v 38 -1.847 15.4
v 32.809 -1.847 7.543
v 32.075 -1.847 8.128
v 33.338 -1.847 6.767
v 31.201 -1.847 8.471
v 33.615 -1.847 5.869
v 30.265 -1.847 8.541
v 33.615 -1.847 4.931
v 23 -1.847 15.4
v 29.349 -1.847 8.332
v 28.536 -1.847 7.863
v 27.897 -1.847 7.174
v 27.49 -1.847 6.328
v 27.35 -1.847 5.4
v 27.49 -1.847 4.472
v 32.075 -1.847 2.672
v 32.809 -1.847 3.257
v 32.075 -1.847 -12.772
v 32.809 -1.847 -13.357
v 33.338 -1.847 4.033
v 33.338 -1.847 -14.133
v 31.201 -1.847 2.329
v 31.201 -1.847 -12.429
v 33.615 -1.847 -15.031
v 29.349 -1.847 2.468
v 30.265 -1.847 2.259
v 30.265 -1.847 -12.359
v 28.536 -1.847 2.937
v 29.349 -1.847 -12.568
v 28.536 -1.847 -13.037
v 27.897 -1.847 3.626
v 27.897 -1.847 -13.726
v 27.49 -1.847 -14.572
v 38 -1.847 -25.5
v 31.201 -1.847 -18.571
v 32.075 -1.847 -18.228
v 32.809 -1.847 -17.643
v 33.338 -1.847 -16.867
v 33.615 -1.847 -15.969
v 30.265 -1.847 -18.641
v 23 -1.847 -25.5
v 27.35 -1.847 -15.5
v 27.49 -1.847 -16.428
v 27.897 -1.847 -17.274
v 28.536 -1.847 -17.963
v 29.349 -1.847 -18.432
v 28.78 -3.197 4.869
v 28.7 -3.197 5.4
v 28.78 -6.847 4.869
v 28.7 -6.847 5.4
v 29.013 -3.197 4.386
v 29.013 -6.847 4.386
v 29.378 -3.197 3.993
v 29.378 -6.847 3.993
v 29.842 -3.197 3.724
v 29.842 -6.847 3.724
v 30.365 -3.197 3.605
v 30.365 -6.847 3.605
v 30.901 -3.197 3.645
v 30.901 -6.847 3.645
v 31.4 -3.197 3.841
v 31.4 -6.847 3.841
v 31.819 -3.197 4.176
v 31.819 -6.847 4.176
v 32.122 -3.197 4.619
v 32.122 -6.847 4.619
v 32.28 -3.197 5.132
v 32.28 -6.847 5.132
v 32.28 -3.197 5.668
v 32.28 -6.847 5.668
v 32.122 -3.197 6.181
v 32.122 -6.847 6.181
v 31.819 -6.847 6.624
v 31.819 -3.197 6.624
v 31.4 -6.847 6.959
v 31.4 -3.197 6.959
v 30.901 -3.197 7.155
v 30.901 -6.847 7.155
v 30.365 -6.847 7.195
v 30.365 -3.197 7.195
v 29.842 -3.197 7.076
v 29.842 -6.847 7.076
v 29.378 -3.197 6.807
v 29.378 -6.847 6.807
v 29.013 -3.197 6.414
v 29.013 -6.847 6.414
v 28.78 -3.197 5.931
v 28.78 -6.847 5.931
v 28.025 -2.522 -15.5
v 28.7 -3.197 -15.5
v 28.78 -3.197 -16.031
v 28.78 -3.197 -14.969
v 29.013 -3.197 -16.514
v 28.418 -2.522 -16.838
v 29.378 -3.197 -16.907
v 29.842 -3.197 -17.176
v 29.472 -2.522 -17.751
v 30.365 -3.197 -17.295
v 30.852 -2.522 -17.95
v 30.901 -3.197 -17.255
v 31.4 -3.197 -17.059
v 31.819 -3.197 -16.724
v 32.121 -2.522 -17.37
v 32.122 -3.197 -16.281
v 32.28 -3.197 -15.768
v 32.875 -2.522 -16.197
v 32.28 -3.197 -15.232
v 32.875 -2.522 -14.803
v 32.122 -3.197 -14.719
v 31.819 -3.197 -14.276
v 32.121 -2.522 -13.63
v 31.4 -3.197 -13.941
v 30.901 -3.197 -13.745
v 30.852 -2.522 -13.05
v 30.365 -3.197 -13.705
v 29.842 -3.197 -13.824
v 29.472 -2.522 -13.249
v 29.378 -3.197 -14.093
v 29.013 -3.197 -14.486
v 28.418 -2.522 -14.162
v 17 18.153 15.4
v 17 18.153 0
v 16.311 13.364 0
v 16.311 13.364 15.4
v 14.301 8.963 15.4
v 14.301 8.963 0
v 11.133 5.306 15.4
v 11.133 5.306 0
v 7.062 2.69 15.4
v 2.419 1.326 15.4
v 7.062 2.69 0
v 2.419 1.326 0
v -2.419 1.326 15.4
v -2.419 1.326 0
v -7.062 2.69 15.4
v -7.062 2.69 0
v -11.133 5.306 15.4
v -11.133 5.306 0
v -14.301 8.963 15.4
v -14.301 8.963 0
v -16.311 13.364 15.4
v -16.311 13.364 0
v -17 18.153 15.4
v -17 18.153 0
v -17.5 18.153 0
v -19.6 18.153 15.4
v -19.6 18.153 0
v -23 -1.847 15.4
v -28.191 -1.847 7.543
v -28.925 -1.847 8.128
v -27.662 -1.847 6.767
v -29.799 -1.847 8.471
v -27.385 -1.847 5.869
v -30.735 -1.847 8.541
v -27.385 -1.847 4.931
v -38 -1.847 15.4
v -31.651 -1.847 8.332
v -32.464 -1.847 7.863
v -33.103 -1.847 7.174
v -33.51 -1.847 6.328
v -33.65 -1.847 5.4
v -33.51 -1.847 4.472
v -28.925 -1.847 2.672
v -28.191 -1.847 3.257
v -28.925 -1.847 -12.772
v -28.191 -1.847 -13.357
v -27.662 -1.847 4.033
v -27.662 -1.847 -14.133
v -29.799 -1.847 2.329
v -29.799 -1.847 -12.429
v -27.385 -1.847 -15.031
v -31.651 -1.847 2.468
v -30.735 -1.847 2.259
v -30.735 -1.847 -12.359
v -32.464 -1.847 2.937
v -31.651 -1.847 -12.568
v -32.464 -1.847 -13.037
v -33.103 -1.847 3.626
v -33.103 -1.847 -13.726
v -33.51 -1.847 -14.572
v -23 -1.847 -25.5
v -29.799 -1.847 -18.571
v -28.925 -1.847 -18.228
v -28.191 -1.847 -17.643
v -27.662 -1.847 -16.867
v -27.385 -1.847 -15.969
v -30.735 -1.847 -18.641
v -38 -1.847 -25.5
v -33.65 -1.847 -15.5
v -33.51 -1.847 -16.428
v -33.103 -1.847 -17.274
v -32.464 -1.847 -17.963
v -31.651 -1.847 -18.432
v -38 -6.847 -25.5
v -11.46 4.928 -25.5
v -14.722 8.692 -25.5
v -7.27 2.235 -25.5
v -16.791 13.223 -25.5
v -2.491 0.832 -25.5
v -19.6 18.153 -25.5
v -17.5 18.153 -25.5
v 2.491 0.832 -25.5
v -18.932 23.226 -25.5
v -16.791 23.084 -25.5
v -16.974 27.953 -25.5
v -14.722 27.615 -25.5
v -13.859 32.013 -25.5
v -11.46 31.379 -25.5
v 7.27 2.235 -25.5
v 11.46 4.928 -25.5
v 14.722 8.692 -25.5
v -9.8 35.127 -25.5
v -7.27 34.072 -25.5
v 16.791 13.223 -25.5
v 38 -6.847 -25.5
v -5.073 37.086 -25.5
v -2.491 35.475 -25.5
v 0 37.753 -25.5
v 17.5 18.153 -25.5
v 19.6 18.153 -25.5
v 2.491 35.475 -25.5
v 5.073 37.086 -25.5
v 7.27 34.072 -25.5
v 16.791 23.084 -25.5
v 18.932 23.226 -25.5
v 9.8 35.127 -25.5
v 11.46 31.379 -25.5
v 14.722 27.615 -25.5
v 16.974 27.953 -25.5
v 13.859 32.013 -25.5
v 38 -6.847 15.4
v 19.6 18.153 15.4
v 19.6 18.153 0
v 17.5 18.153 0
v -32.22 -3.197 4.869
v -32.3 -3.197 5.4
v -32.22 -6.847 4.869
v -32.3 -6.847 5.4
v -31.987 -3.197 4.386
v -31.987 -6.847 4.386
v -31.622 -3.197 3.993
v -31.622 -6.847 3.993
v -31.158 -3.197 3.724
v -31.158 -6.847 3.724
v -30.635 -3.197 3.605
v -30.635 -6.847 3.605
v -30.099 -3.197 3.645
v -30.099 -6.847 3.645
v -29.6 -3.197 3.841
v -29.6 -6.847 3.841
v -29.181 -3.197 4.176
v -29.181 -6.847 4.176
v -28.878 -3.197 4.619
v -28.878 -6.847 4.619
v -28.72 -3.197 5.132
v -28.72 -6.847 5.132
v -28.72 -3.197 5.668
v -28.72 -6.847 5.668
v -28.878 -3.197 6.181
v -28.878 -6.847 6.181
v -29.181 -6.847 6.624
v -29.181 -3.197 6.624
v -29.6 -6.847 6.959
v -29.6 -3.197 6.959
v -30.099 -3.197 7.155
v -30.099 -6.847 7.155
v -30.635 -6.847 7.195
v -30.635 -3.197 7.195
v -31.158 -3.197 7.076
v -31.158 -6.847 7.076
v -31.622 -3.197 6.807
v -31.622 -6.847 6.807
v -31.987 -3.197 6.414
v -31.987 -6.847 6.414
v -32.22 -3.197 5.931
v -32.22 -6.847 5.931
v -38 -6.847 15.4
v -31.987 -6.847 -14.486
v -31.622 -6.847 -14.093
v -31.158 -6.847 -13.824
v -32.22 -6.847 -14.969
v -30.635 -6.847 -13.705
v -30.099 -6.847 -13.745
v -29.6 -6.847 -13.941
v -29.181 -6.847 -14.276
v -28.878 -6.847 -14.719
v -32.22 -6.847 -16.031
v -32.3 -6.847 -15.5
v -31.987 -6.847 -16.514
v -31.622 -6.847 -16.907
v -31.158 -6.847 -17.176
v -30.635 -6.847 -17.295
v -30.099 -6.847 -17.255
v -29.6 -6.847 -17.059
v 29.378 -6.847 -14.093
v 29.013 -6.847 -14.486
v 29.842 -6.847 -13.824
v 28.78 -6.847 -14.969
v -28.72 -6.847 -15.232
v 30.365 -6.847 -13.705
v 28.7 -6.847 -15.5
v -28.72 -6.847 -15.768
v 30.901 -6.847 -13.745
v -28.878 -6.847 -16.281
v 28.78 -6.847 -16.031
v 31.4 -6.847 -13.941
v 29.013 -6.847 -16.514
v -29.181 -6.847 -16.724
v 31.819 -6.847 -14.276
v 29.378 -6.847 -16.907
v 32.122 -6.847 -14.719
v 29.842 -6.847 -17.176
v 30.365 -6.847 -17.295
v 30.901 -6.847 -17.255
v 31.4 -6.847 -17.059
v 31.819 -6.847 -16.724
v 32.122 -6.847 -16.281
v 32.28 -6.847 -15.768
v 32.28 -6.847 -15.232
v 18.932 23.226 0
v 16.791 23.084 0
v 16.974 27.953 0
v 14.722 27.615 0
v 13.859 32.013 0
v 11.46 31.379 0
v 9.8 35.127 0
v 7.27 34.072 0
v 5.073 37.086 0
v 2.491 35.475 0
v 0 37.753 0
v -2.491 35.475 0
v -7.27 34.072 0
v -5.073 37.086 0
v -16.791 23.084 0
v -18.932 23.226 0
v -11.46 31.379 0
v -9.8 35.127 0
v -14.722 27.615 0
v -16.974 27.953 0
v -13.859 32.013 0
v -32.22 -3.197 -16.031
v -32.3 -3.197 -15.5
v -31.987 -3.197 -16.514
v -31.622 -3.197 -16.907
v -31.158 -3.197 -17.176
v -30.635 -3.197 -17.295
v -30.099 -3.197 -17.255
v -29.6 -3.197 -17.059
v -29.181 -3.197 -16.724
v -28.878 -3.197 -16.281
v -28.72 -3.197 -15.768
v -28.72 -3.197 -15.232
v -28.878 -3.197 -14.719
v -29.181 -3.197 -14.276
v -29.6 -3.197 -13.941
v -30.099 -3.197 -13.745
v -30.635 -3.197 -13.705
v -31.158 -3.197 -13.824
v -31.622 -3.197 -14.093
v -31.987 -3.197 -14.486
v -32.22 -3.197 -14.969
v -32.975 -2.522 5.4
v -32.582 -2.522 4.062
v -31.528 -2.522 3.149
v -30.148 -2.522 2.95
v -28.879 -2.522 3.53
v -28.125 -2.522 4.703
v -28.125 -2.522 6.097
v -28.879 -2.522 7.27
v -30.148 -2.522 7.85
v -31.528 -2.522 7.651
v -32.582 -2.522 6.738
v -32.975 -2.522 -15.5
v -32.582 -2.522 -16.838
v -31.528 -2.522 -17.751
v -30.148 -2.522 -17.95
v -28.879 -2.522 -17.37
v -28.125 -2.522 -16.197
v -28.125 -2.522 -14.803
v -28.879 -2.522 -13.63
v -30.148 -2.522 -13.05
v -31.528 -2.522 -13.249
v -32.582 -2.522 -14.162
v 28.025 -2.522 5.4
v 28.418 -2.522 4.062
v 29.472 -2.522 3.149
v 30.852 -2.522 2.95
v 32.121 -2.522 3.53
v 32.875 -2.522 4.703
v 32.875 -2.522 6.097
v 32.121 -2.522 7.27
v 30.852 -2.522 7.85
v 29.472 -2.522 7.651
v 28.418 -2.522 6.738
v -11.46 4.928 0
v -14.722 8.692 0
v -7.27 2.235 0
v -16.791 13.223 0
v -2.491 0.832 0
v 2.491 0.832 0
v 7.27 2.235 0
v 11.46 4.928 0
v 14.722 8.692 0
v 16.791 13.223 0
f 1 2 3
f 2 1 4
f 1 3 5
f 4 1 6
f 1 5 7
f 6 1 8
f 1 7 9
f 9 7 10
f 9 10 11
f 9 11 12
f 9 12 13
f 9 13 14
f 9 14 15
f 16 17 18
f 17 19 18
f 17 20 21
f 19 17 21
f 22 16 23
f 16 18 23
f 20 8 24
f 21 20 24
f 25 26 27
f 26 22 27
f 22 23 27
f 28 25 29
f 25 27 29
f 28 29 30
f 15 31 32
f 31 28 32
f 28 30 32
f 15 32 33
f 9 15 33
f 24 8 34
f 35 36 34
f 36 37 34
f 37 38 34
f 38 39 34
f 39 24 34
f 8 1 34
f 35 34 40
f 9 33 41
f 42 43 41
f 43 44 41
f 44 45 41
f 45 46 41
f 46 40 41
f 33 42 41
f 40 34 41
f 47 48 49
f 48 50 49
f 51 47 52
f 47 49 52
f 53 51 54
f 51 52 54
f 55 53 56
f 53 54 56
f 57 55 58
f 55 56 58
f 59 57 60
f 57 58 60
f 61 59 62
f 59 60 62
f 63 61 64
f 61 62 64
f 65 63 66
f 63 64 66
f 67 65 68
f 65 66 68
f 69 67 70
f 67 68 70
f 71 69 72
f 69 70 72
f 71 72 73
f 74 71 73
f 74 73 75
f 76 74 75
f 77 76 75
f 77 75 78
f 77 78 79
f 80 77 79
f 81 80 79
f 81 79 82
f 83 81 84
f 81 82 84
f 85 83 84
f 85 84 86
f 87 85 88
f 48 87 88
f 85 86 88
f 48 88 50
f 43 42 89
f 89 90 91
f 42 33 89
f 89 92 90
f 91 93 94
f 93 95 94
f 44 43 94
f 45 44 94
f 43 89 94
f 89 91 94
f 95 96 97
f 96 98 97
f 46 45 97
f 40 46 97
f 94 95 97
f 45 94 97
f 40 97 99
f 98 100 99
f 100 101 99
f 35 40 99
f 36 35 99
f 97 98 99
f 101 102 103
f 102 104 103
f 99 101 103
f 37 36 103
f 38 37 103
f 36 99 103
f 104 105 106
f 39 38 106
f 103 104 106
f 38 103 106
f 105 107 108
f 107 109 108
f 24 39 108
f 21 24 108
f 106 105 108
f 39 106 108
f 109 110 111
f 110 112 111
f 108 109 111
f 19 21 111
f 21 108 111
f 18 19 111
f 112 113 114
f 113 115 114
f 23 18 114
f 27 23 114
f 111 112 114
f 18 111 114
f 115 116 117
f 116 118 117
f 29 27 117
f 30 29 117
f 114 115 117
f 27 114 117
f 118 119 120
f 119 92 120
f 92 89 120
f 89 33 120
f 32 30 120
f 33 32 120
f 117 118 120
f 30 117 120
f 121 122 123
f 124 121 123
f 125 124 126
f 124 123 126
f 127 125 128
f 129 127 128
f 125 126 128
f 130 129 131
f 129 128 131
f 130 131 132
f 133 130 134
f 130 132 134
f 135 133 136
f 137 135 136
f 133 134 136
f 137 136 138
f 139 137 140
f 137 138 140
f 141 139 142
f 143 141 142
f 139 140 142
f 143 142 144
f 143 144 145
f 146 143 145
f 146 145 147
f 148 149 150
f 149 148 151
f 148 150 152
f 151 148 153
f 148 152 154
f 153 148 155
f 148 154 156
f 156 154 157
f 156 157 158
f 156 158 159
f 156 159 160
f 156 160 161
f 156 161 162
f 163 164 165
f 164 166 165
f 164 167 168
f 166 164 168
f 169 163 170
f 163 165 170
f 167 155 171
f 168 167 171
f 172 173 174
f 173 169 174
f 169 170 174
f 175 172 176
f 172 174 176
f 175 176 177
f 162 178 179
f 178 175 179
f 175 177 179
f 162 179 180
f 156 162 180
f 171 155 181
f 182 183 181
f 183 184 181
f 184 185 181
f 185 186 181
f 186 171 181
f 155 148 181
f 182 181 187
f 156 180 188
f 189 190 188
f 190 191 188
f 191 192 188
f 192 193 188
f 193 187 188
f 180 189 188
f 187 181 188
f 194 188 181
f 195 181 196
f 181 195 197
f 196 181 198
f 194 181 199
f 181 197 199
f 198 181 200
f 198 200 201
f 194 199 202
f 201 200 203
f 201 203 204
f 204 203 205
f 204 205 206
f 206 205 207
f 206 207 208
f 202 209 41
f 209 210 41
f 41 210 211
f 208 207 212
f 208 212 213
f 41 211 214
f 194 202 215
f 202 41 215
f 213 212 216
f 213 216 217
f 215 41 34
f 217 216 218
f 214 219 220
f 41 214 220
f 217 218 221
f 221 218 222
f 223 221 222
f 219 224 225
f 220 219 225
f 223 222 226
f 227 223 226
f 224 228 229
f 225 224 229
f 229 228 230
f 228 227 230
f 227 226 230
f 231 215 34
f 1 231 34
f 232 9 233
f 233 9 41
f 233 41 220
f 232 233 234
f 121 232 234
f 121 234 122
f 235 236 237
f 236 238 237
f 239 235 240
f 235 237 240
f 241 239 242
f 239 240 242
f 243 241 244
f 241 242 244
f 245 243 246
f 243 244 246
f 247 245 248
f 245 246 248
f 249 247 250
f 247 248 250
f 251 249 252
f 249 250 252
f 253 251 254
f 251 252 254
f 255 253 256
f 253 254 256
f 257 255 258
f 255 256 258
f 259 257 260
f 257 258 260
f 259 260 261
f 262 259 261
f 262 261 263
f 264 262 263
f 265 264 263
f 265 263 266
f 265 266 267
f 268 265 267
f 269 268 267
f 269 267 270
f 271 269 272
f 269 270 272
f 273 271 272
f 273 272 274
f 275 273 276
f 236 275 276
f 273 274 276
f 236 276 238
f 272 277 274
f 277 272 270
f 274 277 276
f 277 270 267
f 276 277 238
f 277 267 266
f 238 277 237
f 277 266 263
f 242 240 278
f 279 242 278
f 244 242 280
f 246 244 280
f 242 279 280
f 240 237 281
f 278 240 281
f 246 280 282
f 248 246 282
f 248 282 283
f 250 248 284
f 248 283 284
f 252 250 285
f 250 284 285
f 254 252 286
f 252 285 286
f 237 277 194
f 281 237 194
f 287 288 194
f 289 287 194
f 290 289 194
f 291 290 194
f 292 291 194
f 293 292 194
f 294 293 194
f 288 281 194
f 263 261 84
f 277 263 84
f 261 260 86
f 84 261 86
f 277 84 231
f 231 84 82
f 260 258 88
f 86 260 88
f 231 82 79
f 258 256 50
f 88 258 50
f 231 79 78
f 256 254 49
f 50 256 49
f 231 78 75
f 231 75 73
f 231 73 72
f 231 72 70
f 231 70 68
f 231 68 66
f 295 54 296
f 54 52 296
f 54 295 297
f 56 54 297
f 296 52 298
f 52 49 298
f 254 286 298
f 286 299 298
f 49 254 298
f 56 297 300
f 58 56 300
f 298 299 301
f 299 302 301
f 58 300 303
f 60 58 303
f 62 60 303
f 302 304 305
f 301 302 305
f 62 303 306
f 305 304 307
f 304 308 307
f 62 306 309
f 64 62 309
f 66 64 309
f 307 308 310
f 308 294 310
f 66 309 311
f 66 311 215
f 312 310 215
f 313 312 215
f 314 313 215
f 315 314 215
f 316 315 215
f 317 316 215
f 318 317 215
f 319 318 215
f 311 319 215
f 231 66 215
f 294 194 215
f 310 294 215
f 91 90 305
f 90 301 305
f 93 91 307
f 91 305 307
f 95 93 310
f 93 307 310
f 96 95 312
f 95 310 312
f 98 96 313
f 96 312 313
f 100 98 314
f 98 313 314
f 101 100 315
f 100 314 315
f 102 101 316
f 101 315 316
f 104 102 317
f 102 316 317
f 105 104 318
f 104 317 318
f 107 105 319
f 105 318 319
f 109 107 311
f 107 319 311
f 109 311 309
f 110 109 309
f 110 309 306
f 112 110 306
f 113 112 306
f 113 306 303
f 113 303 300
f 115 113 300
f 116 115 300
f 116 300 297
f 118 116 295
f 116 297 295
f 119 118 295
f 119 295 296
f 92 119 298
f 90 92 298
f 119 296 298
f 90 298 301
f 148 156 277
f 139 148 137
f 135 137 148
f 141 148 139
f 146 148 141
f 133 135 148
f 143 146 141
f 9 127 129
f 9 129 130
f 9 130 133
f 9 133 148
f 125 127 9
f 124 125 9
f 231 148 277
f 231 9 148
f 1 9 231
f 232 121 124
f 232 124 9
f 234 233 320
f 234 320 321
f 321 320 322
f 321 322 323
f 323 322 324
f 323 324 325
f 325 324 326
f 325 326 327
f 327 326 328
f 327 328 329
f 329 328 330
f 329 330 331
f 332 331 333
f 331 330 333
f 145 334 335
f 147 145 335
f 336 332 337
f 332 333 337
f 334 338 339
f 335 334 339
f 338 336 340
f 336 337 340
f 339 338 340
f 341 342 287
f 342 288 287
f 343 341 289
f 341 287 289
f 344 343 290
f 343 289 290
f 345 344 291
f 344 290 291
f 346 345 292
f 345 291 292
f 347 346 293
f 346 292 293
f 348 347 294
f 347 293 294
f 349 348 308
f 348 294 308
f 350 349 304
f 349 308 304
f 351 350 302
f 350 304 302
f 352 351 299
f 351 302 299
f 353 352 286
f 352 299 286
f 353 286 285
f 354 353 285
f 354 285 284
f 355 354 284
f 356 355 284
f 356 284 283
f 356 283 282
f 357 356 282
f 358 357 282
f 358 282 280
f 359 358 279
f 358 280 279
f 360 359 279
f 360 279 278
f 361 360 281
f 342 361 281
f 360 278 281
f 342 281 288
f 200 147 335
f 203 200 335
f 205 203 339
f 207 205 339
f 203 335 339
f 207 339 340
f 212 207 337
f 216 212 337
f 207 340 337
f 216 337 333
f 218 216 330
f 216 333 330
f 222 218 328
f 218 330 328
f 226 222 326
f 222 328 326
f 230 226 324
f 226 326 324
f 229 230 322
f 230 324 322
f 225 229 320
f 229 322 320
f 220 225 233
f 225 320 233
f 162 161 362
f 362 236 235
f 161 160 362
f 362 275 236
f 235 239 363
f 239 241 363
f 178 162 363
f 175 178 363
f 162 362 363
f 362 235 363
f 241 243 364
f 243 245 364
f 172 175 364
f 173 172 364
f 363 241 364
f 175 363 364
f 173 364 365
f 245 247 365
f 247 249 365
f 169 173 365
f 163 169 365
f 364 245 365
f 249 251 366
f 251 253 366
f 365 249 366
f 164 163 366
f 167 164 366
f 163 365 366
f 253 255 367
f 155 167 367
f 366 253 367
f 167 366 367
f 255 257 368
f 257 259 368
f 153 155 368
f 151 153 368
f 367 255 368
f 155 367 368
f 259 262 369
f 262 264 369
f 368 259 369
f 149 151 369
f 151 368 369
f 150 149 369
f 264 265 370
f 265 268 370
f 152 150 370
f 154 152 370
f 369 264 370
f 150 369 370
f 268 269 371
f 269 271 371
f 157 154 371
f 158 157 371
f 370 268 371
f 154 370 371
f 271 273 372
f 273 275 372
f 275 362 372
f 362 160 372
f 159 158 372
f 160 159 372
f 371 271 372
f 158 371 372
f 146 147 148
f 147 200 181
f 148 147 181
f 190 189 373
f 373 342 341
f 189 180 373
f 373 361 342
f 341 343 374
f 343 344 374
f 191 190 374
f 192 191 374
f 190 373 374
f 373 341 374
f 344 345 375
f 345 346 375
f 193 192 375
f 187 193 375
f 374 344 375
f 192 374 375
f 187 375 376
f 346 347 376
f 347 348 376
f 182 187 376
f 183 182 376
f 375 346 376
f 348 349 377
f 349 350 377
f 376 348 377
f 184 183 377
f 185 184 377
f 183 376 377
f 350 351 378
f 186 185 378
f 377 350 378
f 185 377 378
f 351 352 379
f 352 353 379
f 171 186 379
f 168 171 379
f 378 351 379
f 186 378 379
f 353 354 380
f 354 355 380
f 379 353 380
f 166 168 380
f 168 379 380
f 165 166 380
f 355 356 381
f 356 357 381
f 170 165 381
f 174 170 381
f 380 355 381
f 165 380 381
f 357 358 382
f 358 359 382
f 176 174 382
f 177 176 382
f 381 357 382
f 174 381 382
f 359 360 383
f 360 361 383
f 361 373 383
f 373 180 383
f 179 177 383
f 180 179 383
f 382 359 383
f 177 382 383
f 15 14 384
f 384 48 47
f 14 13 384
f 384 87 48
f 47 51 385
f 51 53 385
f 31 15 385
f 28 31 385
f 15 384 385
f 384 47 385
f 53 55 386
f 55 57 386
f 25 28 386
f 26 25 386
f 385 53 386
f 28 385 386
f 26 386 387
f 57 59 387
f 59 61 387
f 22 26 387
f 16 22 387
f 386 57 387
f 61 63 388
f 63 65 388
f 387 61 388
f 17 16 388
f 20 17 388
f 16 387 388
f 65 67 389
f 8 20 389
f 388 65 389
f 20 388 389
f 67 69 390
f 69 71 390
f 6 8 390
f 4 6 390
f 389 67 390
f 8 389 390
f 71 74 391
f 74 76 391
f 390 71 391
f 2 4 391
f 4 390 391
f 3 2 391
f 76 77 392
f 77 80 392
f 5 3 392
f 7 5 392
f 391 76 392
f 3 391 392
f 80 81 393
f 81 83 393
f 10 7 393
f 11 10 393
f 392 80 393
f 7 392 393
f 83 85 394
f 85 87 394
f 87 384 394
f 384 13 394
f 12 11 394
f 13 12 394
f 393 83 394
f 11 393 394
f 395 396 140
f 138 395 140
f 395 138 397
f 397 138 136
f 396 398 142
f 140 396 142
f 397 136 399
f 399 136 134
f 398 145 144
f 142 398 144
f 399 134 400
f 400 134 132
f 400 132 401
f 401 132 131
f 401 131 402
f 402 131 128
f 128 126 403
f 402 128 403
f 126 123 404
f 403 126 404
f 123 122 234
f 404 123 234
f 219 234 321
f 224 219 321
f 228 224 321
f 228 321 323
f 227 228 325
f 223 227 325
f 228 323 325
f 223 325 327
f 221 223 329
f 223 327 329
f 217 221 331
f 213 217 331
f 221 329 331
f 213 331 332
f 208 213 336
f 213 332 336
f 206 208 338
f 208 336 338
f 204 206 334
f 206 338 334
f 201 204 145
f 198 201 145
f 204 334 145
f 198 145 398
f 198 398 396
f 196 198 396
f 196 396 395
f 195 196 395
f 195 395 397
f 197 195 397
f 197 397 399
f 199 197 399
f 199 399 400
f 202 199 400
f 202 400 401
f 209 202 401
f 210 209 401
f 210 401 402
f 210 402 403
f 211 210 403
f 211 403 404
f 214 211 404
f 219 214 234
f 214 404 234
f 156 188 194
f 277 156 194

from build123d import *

# Parameters (mm, degrees)
SKETCH1_R                                       = 17.5
BOSS_EXTRUDE9_DEPTH                             = 25.5
BOSS_EXTRUDE10_DEPTH                            = 15.4
BOSS_EXTRUDE10_DEPTH_BACK                       = 25.5
CSK_FOR_M3_FLAT_HEAD_MACHINE_SCREW1_D           = 3.6
CSK_FOR_M3_FLAT_HEAD_MACHINE_SCREW1_CSINK_D     = 6.3
CSK_FOR_M3_FLAT_HEAD_MACHINE_SCREW1_CSINK_ANGLE = 90
CSK_FOR_M3_FLAT_HEAD_MACHINE_SCREW2_D           = 3.6
CSK_FOR_M3_FLAT_HEAD_MACHINE_SCREW2_CSINK_D     = 6.3
CSK_FOR_M3_FLAT_HEAD_MACHINE_SCREW2_CSINK_ANGLE = 90
BOSS_EXTRUDE11_DEPTH                            = 15.4


with BuildPart() as part:
    # Sketch1 → Boss-Extrude9 (new body)
    with BuildSketch(Plane.XY):
        with BuildLine():
            ThreePointArc((-19.6, 18.153395679), (0, 37.753395679), (19.6, 18.153395679))
            ThreePointArc((19.6, 18.153395679), (0, -1.446604321), (-19.6, 18.153395679))
        make_face()
        with Locations((0, 18.153395679)):
            Circle(SKETCH1_R, mode=Mode.SUBTRACT)
    extrude(amount=-BOSS_EXTRUDE9_DEPTH)

    # Sketch1<15> → Boss-Extrude10 (add, two sides: drawn at the far end of the back side and taken through both)
    with BuildSketch(Plane.XY.offset(-BOSS_EXTRUDE10_DEPTH_BACK)):
        with BuildLine():
            Line((-23, -1.846604321), (-38, -1.846604321))
            Line((-38, -1.846604321), (-38, -6.846604321))
            Line((-38, -6.846604321), (38, -6.846604321))
            Line((38, -6.846604321), (38, -1.846604321))
            Line((38, -1.846604321), (23, -1.846604321))
            Line((23, -1.846604321), (19.6, 18.153395679))
            ThreePointArc((19.6, 18.153395679), (0, -1.446604321), (-19.6, 18.153395679))
            Line((-19.6, 18.153395679), (-23, -1.846604321))
        make_face()
    extrude(amount=BOSS_EXTRUDE10_DEPTH + BOSS_EXTRUDE10_DEPTH_BACK)

    # CSK for M3 Flat Head Machine Screw1 (through all)
    with Locations(Plane(origin=(0, -1.846604321, 0), x_dir=(1, 0, 0), z_dir=(0, 1, 0))):
        with Locations((-30.5, 15.5), (-30.5, -5.4)):
            CounterSinkHole(CSK_FOR_M3_FLAT_HEAD_MACHINE_SCREW1_D / 2, CSK_FOR_M3_FLAT_HEAD_MACHINE_SCREW1_CSINK_D / 2, counter_sink_angle=CSK_FOR_M3_FLAT_HEAD_MACHINE_SCREW1_CSINK_ANGLE)

    # CSK for M3 Flat Head Machine Screw2 (through all)
    with Locations(Plane(origin=(0, -1.846604321, 0), x_dir=(1, 0, 0), z_dir=(0, 1, 0))):
        with Locations((30.5, -5.4), (30.5, 15.5)):
            CounterSinkHole(CSK_FOR_M3_FLAT_HEAD_MACHINE_SCREW2_D / 2, CSK_FOR_M3_FLAT_HEAD_MACHINE_SCREW2_CSINK_D / 2, counter_sink_angle=CSK_FOR_M3_FLAT_HEAD_MACHINE_SCREW2_CSINK_ANGLE)

    # Sketch1<19> → Boss-Extrude11 (add)
    with BuildSketch(Plane.XY):
        with BuildLine():
            ThreePointArc((-19.6, 18.153395679), (0, -1.446604321), (19.6, 18.153395679))
            Line((19.6, 18.153395679), (17, 18.153395679))
            ThreePointArc((17, 18.153395679), (0, 1.153395679), (-17, 18.153395679))
            Line((-17, 18.153395679), (-19.6, 18.153395679))
        make_face()
    extrude(amount=BOSS_EXTRUDE11_DEPTH)


solid = part.part
